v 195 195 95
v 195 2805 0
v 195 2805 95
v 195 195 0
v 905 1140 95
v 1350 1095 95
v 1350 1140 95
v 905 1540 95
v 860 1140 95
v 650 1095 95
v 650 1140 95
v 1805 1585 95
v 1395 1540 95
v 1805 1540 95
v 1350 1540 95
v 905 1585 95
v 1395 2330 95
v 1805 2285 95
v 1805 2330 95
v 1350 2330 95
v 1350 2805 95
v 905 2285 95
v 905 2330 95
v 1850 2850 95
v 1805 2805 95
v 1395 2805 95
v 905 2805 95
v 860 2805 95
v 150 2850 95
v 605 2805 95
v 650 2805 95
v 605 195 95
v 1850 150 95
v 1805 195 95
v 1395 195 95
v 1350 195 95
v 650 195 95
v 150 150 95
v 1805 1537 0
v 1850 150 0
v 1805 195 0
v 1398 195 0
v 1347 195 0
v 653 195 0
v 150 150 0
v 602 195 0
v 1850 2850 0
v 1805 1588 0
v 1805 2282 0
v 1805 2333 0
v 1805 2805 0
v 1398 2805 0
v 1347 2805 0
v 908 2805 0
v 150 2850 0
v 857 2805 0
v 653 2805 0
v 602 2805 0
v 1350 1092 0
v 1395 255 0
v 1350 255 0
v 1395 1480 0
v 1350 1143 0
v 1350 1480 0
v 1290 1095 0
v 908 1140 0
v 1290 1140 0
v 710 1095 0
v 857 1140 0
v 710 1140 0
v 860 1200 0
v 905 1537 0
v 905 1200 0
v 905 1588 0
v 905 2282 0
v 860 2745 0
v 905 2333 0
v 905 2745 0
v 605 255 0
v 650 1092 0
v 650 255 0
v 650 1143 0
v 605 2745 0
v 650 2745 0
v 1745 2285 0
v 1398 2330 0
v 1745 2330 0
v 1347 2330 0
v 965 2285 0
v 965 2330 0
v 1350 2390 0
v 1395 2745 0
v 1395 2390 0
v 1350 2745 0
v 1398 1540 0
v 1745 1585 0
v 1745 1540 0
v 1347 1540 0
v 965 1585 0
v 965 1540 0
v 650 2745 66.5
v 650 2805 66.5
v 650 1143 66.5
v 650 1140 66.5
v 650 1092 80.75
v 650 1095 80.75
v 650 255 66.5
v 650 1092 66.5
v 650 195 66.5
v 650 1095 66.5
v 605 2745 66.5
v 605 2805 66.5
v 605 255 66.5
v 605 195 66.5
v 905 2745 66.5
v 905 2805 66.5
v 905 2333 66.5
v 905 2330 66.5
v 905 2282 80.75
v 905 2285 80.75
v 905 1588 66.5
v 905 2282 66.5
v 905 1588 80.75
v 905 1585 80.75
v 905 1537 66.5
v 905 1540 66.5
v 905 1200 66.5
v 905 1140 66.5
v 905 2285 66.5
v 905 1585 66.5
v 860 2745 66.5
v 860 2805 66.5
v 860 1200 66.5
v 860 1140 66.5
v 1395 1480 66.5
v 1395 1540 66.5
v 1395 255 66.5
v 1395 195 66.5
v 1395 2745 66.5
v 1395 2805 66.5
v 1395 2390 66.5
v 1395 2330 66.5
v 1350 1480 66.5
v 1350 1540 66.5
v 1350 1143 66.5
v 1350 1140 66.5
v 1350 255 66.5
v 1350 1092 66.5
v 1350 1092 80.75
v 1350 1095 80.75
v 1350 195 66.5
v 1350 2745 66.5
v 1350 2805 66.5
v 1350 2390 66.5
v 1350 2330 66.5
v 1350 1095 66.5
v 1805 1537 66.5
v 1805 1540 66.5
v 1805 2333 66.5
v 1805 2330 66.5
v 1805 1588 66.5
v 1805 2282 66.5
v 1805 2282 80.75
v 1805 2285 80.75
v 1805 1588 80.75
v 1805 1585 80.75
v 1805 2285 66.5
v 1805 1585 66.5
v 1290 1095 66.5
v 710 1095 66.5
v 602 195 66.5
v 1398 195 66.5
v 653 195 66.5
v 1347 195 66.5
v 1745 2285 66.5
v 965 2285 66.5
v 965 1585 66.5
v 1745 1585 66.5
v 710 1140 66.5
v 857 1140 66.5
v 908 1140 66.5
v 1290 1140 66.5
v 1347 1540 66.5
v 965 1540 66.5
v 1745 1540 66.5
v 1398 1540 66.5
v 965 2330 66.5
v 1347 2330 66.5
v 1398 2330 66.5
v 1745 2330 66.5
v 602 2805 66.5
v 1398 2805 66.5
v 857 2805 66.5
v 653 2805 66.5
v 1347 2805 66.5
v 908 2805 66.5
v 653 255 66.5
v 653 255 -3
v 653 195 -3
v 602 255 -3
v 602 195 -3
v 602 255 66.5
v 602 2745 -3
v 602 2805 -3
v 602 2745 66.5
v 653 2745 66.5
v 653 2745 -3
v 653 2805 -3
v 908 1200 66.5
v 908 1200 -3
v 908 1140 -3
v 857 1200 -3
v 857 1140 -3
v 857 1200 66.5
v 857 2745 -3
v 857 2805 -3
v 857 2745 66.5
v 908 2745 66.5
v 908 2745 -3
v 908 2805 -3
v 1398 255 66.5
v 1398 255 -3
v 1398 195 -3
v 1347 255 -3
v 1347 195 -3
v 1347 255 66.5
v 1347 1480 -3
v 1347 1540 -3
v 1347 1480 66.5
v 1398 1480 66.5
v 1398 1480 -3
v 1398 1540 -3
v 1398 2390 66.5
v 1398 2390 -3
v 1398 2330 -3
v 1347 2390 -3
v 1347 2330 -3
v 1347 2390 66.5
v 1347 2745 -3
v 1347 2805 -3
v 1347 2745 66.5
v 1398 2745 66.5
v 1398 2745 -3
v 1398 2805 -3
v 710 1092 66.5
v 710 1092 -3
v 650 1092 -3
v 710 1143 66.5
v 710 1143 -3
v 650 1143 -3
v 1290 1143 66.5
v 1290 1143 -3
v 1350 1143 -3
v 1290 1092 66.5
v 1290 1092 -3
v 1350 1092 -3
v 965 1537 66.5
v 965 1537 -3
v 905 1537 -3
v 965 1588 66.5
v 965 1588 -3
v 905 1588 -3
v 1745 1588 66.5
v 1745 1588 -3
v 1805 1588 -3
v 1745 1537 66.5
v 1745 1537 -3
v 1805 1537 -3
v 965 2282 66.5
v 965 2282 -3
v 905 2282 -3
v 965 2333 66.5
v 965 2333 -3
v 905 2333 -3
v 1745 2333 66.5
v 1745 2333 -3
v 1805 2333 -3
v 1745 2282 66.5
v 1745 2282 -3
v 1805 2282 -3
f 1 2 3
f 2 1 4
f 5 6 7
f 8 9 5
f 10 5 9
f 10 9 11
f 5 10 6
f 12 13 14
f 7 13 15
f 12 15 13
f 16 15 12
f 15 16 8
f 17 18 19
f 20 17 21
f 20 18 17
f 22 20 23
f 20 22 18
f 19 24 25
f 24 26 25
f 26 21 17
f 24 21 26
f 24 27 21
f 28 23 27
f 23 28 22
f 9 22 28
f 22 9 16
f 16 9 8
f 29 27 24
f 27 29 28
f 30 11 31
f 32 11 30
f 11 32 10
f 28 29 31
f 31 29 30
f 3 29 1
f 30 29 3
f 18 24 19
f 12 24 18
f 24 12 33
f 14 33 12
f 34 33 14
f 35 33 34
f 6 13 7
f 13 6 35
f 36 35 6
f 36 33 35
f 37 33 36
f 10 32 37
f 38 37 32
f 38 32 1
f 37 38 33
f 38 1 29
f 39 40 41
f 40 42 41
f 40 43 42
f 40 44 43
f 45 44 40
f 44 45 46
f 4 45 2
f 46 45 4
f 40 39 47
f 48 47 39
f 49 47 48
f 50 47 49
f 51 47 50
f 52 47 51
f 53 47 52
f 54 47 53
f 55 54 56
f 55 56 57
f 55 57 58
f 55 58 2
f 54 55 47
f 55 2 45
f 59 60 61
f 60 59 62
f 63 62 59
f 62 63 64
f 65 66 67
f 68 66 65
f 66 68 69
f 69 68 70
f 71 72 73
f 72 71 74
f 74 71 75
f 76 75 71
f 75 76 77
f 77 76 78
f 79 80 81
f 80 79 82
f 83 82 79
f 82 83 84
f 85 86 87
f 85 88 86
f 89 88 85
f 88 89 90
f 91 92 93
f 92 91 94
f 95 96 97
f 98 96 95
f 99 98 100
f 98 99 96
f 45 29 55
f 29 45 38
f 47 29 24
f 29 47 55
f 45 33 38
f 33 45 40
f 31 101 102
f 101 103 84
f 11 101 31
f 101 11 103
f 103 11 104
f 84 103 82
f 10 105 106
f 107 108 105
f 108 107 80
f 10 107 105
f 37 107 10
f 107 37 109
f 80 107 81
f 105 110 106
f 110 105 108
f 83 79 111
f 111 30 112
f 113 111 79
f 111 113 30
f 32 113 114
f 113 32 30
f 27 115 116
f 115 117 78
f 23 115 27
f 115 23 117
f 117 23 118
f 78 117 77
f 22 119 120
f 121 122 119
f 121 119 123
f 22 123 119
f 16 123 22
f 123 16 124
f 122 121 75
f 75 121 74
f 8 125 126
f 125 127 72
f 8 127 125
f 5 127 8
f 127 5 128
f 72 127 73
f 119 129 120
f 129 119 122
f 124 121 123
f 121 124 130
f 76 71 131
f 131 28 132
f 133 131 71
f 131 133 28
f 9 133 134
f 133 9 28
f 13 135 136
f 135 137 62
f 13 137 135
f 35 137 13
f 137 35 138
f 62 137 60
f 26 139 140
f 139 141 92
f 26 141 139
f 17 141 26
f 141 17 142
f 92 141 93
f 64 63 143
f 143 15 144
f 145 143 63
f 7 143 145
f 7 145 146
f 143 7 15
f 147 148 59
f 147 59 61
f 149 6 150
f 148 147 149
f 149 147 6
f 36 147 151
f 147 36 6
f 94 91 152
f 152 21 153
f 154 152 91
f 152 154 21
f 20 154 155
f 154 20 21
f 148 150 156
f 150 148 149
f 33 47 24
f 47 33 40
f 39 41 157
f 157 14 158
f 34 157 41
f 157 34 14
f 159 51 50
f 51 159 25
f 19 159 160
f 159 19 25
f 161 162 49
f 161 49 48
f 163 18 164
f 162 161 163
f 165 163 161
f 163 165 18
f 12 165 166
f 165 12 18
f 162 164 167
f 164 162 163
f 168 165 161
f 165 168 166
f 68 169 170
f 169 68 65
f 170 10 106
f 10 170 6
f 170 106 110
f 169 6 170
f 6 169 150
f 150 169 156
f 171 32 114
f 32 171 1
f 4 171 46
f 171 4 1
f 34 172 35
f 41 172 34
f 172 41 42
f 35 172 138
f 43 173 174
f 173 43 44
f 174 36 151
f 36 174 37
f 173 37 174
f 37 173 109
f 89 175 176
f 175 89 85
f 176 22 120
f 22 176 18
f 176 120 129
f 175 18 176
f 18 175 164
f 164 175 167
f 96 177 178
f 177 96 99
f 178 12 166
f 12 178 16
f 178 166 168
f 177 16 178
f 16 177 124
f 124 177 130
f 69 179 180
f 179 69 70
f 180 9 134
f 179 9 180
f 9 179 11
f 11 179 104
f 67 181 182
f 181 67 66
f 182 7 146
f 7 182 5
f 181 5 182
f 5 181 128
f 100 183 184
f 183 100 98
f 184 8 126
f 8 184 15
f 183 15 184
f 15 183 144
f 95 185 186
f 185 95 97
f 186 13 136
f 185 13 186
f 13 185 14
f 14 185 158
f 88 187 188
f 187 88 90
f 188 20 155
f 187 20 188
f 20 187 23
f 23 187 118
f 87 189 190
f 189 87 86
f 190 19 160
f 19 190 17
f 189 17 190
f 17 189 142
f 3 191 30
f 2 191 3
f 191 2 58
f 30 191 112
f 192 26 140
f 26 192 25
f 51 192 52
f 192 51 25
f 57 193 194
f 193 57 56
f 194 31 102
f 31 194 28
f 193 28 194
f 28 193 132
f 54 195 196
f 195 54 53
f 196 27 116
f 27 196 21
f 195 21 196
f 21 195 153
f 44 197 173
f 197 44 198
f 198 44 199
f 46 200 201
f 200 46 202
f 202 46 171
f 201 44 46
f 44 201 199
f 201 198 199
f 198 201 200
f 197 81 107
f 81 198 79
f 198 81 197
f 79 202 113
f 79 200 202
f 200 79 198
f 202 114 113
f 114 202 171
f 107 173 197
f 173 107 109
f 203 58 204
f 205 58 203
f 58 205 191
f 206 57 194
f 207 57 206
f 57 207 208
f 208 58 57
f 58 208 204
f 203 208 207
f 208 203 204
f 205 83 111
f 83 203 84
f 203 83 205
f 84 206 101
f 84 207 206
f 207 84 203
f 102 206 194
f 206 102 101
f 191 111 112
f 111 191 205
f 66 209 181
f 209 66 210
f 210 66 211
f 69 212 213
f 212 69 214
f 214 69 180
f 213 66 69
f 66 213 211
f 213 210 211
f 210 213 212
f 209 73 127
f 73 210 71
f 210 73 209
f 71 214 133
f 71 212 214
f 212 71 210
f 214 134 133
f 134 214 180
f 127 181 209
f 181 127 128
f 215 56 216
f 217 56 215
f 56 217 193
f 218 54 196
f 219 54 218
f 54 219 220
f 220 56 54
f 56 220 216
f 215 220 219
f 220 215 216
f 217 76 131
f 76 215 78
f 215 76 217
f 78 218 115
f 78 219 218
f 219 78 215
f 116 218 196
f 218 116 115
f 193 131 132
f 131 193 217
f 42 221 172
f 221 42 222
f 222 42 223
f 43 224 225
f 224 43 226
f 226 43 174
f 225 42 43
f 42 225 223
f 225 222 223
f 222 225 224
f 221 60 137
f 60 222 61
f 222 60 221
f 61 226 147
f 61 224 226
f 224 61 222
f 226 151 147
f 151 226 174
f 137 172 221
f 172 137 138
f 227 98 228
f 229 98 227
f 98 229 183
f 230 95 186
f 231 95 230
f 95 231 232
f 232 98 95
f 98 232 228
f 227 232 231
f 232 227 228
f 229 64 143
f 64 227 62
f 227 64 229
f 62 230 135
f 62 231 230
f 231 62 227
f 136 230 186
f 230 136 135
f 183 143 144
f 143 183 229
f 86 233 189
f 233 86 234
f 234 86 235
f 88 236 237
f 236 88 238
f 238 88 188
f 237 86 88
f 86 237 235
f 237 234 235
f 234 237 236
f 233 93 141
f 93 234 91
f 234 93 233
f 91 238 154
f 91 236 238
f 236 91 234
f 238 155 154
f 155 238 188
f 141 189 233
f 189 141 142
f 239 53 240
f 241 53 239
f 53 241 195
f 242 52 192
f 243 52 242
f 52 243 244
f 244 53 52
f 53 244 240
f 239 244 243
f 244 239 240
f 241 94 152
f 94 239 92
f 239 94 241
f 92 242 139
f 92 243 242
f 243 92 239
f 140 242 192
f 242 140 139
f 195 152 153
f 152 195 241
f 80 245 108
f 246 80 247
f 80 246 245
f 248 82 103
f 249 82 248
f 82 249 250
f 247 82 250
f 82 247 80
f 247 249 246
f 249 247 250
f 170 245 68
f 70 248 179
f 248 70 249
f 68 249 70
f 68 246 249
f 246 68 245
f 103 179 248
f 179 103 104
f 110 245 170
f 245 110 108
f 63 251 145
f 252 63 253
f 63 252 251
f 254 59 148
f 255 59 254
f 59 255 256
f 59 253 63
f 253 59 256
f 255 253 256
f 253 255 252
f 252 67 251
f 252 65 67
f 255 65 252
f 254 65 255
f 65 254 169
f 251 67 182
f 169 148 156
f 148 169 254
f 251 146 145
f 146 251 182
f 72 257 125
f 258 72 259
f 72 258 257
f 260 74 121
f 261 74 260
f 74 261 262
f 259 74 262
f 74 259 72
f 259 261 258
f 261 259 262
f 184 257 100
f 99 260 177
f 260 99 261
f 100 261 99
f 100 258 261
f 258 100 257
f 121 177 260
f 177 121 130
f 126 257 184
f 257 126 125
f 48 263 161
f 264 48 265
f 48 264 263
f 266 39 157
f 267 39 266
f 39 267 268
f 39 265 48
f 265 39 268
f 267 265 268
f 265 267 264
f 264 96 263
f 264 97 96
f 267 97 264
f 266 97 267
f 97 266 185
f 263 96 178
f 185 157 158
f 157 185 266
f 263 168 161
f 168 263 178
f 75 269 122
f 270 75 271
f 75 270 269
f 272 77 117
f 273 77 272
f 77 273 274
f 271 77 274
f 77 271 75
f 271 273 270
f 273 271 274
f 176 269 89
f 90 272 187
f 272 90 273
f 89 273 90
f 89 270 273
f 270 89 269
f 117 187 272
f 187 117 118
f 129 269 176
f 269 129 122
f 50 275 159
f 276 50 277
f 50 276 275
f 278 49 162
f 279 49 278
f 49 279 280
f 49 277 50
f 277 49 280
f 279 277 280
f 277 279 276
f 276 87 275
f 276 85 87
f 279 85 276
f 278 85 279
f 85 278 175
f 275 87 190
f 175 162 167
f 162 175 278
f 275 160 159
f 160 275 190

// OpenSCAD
// file: ../../../src/lib/ctx.scad
// Context vectors and accessors.
// Conventions:
//  - dims:      basic geometric envelope (length, width, eave height, ...)
//  - palette:   colors used by every module
//  - clad_spec: cladding board geometry
//  - mesh_spec: mesh aperture / bar / frame
//  - stud_spec: stud framing

// --- dims --------------------------------------------------------------------

function dims(length, width, eave_h=2500, base_h=120, wall_t=100) =
    [length, width, eave_h, base_h, wall_t];

function dims_length(d) = d[0];
function dims_width(d)  = d[1];
function dims_eave_h(d) = d[2];
function dims_base_h(d) = d[3];
function dims_wall_t(d) = d[4];

// --- palette -----------------------------------------------------------------

function palette(
    post   = [0.72, 0.56, 0.30],
    wall   = [0.78, 0.65, 0.45],
    panel1 = [0.62, 0.45, 0.22],
    panel2 = [0.56, 0.40, 0.18],
    trim   = [0.58, 0.42, 0.20],
    mesh   = [0.25, 0.25, 0.25],
    roof   = [0.15, 0.15, 0.15],
    glass  = [0.70, 0.82, 0.88, 0.35],
    base   = [0.78, 0.78, 0.74],
    floor  = [0.80, 0.72, 0.52],
    table  = [0.72, 0.56, 0.34],
    bench  = [0.80, 0.70, 0.48],
    door   = [0.66, 0.48, 0.24],
    lamp   = [0.20, 0.20, 0.18],
    glow   = [1.00, 0.92, 0.60, 0.50],
    elec   = [0.85, 0.85, 0.82],
    laptop = [0.22, 0.22, 0.24],
    screen = [0.30, 0.55, 0.75, 0.60],
    shelf  = [0.65, 0.50, 0.28],
    polycarb = [0.78, 0.85, 0.92, 0.30],
    insulation = [0.95, 0.90, 0.65]
) = [post, wall, panel1, panel2, trim, mesh, roof, glass, base, floor,
     table, bench, door, lamp, glow, elec, laptop, screen, shelf,
     polycarb, insulation];

function pal_post(p)       = p[0];
function pal_wall(p)       = p[1];
function pal_panel1(p)     = p[2];
function pal_panel2(p)     = p[3];
function pal_trim(p)       = p[4];
function pal_mesh(p)       = p[5];
function pal_roof(p)       = p[6];
function pal_glass(p)      = p[7];
function pal_base(p)       = p[8];
function pal_floor(p)      = p[9];
function pal_table(p)      = p[10];
function pal_bench(p)      = p[11];
function pal_door(p)       = p[12];
function pal_lamp(p)       = p[13];
function pal_glow(p)       = p[14];
function pal_elec(p)       = p[15];
function pal_laptop(p)     = p[16];
function pal_screen(p)     = p[17];
function pal_shelf(p)      = p[18];
function pal_polycarb(p)   = p[19];
function pal_insulation(p) = p[20];

// --- clad_spec ---------------------------------------------------------------

function clad_spec(board_h=150, overlap=40, thick=24, lip=18) =
    [board_h, overlap, thick, lip];

function cs_board_h(c) = c[0];
function cs_overlap(c) = c[1];
function cs_thick(c)   = c[2];
function cs_lip(c)     = c[3];
function cs_step(c)    = c[0] - c[1];

// --- bob_spec (board-on-board cladding) -------------------------------------
//
// Vertical board-on-board cladding: two layers of boards. Back layer stepped at
// pitch = board_w + back_gap; front layer centred on the gaps, overlapping
// each adjacent back board by `overlap` mm per side.
//   board_w  = board width along the wall (e.g. 150 mm)
//   board_t  = board thickness (e.g. 25 mm)
//   overlap  = front-on-back overlap per side (e.g. 25 mm, BR minimum 22)
//   back_gap = gap between adjacent back boards (e.g. 100 mm)
// Invariant: board_w = back_gap + 2*overlap (so the front board exactly
// covers the gap + the required overlaps).

function bob_spec(board_w=150, board_t=25, overlap=25, back_gap=100) =
    [board_w, board_t, overlap, back_gap];

function bs_board_w(b)  = b[0];
function bs_board_t(b)  = b[1];
function bs_overlap(b)  = b[2];
function bs_back_gap(b) = b[3];
function bs_pitch(b)    = b[0] + b[3];     // c/c module width
function bs_stickout(b) = 2 * b[1];         // total cladding thickness

// --- mesh_spec ---------------------------------------------------------------

function mesh_spec(spacing=150, bar=8, frame=40, depth=20) =
    [spacing, bar, frame, depth];

function ms_spacing(m) = m[0];
function ms_bar(m)     = m[1];
function ms_frame(m)   = m[2];
function ms_depth(m)   = m[3];

// --- stud_spec ---------------------------------------------------------------

function stud_spec(stud_w=45, stud_d=95, spacing=600) =
    [stud_w, stud_d, spacing];

function ss_w(s)       = s[0];
function ss_d(s)       = s[1];
function ss_spacing(s) = s[2];
// file: ../../../src/lib/primitives/beslag.scad
// Beslag (steel connectors) primitives.
//
// Each module renders a simplified galvanised-grey shape. The geometry is
// approximate — the primary purpose is to make the connector visible at
// audit time so the user can see WHERE every bracket goes.

include <../defaults.scad>

BESLAG_COLOR = [0.62, 0.62, 0.66];

// M10 anchor screw, ~120 mm long. Head sits at Z=top_z (top of fundablok
// ring / sokkel), shaft sinks 120 mm down into the ring.
//   p     = [x, y] on the ring centerline
//   top_z = Z of the ring top (default 0 for legacy callers)
module ankerskrue_m10(p, top_z=0, system="fundament") {
    color(BESLAG_COLOR) {
        translate([p[0], p[1], top_z - 120]) cylinder(h=120, r=5, $fn=12);
        translate([p[0], p[1], top_z])       cylinder(h=8,  r1=10, r2=8, $fn=12);
    }
}

// 90×90 mm perforated angle bracket (vinkelbeslag), e.g. Simpson L70/L90.
//   leg          = leg length (mm)
//   thick        = steel thickness (mm)
//   width        = perpendicular flange width — the bracket's "depth" along
//                  the axis NOT in its bend plane. Default = thick (legacy
//                  thin-rod look). Pass ~50 mm for a realistic flat strap.
//   orientation  = "+x+z" / "-x+z" / "+y+z" / "-y+z" — bend plane.
//                  "+x+z" → leg-1 along +X face, leg-2 along +Z face.
//                  Width then extends along Y (the plane-perpendicular axis).
// Origin = inside corner of the L.
module vinkelbeslag(p, leg=90, thick=2, width=undef,
                    orientation="+x+z", system="vaegge") {
    w = is_undef(width) ? thick : width;
    color(BESLAG_COLOR)
    translate(p)
    if (orientation == "+x+z") {
        cube([leg, w, thick]);             // horizontal leg, +X
        cube([thick, w, leg]);             // vertical leg, +Z
    } else if (orientation == "-x+z") {
        translate([-leg, 0, 0])   cube([leg, w, thick]);
        translate([-thick, 0, 0]) cube([thick, w, leg]);
    } else if (orientation == "+y+z") {
        cube([w, leg, thick]);
        cube([w, thick, leg]);
    } else if (orientation == "-y+z") {
        translate([0, -leg, 0])   cube([w, leg, thick]);
        translate([0, -thick, 0]) cube([w, thick, leg]);
    }
}

// Joist hanger (stroesko / bjælkesko) — U-saddle that carries a floor strø /
// veksel where it frames into a header or ledger. Canonical orientation: the
// joist runs +Y away from the support; the support face is the X-Z plane at
// Y=0; the joist bottom sits at Z=0, centred on X=0. Rotate/translate to place.
//   w, h = joist section (width × height); seat = wrap length along the joist
module stroesko(w=45, h=95, seat=60, t=3, system="gulv") {
    color(BESLAG_COLOR) {
        // back flange nailed to the support face
        translate([-w/2 - t, -t, 0]) cube([w + 2*t, t, h*0.85]);
        // bottom saddle under the joist
        translate([-w/2 - t, 0, -t]) cube([w + 2*t, seat, t]);
        // two side straps up the joist faces
        translate([-w/2 - t, 0, 0]) cube([t, seat, h*0.70]);
        translate([ w/2,     0, 0]) cube([t, seat, h*0.70]);
    }
}
// file: ../../../src/lib/primitives/fundablok.scad
// Fundablok strip foundation primitive.
//
// DK fundablok = 50 × 15 × 20 cm concrete foundation block (length × width
// × height when laid), dry-stacked in 3 courses in halvstensforbandt with
// cores filled with armed concrete after laying. The continuous ring
// carries all wall lines (perimeter + interior load-bearing walls) and
// sits in a frostfri trench (~80 cm dig, 20 cm stabilgrus bottom layer,
// top of blocks at grade Z=0).
//
// fundablok_ring() renders each block individually with halvstensforbandt
// offsets — odd courses are shifted ½ block (250 mm) along the wall axis
// so vertical seams stagger between courses. Strips whose clear span
// isn't a multiple of 500 mm get a clipped end block (same as real
// practice — cut block on site).

FUNDABLOK_L         = 500;
FUNDABLOK_W         = 150;
FUNDABLOK_H         = 200;
FUNDABLOK_COLOR     = [0.78, 0.76, 0.72];
FUNDABLOK_JOINT     = 3;     // visible seam between blocks in a course
FUNDABLOK_JOINT_Z   = 2;     // visible seam between courses

// One row of fundabloks along +X within a strip of given length.
//   origin       = [x, y] of strip's outer-bottom corner
//   length       = strip length along X
//   z            = block bottom Z
//   start_offset = X position of first joint (0 for even courses, -L/2
//                  for odd courses to stagger seams)
module _fb_strip_x(origin, length, z, start_offset) {
    bl = FUNDABLOK_L; bw = FUNDABLOK_W; bh = FUNDABLOK_H;
    j  = FUNDABLOK_JOINT;
    for (raw_x = [start_offset - bl : bl : length]) {
        x0 = max(raw_x, 0);
        x1 = min(raw_x + bl, length);
        if (x1 - x0 > 1)
            translate([origin[0] + x0 + j/2, origin[1] + j/2, z])
                cube([x1 - x0 - j, bw - j, bh - FUNDABLOK_JOINT_Z]);
    }
}

// One row of fundabloks along +Y within a strip of given length.
module _fb_strip_y(origin, length, z, start_offset) {
    bl = FUNDABLOK_L; bw = FUNDABLOK_W; bh = FUNDABLOK_H;
    j  = FUNDABLOK_JOINT;
    for (raw_y = [start_offset - bl : bl : length]) {
        y0 = max(raw_y, 0);
        y1 = min(raw_y + bl, length);
        if (y1 - y0 > 1)
            translate([origin[0] + j/2, origin[1] + y0 + j/2, z])
                cube([bw - j, y1 - y0 - j, bh - FUNDABLOK_JOINT_Z]);
    }
}

// Multi-course fundablok strip — one segment of a ring, oriented along X
// or Y. Halvstensforbandt offsets are applied automatically across courses.
//   orientation = "X" or "Y"
//   origin      = [x, y] outer-bottom corner of the strip
//   length      = strip length along the chosen axis
//   courses     = number of vertical courses (default 3)
//   top_z       = Z of the top course's top face
module fundablok_strip(orientation, origin, length, courses = 3, top_z = 0) {
    h_per   = FUNDABLOK_H;
    total_h = courses * h_per;
    z_bot   = top_z - total_h;
    color(FUNDABLOK_COLOR)
    for (c = [0 : courses - 1]) {
        z   = z_bot + c * h_per;
        off = (c % 2 == 0) ? 0 : -FUNDABLOK_L / 2;
        if (orientation == "X")
            _fb_strip_x(origin, length, z, off);
        else
            _fb_strip_y(origin, length, z, off);
    }
}

// Continuous fundablok ring around a [ll × ww] rectangle with optional
// cross-walls at the X positions in `partitions_x`. The ring outer face
// is flush with [0,0]..[ll,ww] (the building outer line); the ring extends
// inward only by FUNDABLOK_W (150 mm) on each face.
//
// `top_z` sets the top-of-ring Z (= sokkel-niveau per the Phase 1 spec —
// "Top af ring = sokkel-niveau (= base h), bundrem af alle vægge sidder
// her"). Default 0 keeps the legacy "top at grade" behaviour. Total
// depth = courses × FUNDABLOK_H, so the ring extends `total_h` below
// `top_z` (most of which is buried in the frostfri grøft).
//
//   ll, ww        — footprint length (X), width (Y)
//   courses       — number of vertical courses (default 3 for halvstensforbandt)
//   partitions_x  — list of X coordinates for interior cross-walls
//   top_z         — Z of the top course's top face (sokkel level)
module fundablok_ring(ll, ww, courses = 3, partitions_x = [], top_z = 0) {
    bw      = FUNDABLOK_W;
    bl      = FUNDABLOK_L;
    h_per   = FUNDABLOK_H;
    total_h = courses * h_per;
    z_bot   = top_z - total_h;

    color(FUNDABLOK_COLOR)
    for (c = [0 : courses - 1]) {
        z   = z_bot + c * h_per;
        off = (c % 2 == 0) ? 0 : -bl/2;

        // Front + back strips run the full ring length along X.
        _fb_strip_x([0, 0],         ll, z, off);
        _fb_strip_x([0, ww - bw],   ll, z, off);

        // Left + right strips fill the clear span between front and back.
        _fb_strip_y([0, bw],         ww - 2*bw, z, off);
        _fb_strip_y([ll - bw, bw],   ww - 2*bw, z, off);

        // Interior cross-walls under load-bearing partitions.
        for (px = partitions_x)
            _fb_strip_y([px - bw/2, bw], ww - 2*bw, z, off);
    }
}
// file: ../../../src/lib/defaults.scad
// Default values. Each library file `include`s this so its module
// signatures can reference DEFAULT_* as default arg values.

include <ctx.scad>

DEFAULT_PALETTE = palette();
DEFAULT_CLAD    = clad_spec();
DEFAULT_BOB     = bob_spec();
DEFAULT_MESH    = mesh_spec();
DEFAULT_STUD    = stud_spec();
// file: ../../../src/designs/house/floor.scad
// HOUSE floor — split into two render modules so each layer can be inspected
// on its own:
//   RenderHouseFloorJoists() — bearing frame of 45×95 reglar laid hard against
//        the inside of the fundablok ring: ONE reglar along V3 and ONE along V5
//        (run in Y) + THREE intermediate bearers (also run in Y), with V1/V2
//        closing the front/back in X. The intermediate bearers are snapped to
//        the lem trimmer lines so each one DOUBLES as a hatch trimmer — no
//        parallel sliver beside the lem frame. Screwed to the ring / hung in
//        strøsko; nothing stacked.
//   RenderHouseFloorHangers()— strøsko at every hung junction (bearers/veksler)
//   RenderHouseFloorDeck()   — ~25 mm sawn-board deck running the SHORT way (X)
//   RenderHouseFloor()       — convenience wrapper (all three)
//
// Levels (z, mm above grade): deck TOP flush with the ring top (RH_BASE_H=120);
// reglar 0..95 against the ring inner faces, deck 95..120 on top.

include <../../lib/defaults.scad>
include <../config.scad>
include <../../lib/primitives/fundablok.scad>   // FUNDABLOK_W
use <../../lib/primitives/beslag.scad>          // stroesko

FLOOR_PLANK_W   = 145;   // visible board width
FLOOR_PLANK_GAP = 4;     // expansion gap between boards

// ring inner opening — the floor sits inside it, flush with the ring top
function _flr_rx0() = FUNDABLOK_W;                    // 150
function _flr_rx1() = RH_HOUSE_LEN   - FUNDABLOK_W;   // 1850
function _flr_ry0() = FUNDABLOK_W;                    // 150
function _flr_ry1() = RH_HOUSE_DEPTH - FUNDABLOK_W;   // 2850

// Bearing frame (ONE layer of 45×95 reglar). The board deck runs in X, so the
// load-bearing reglar run in Y at c/c <=600. The intermediate bearers are
// SNAPPED to the lem trimmer lines so each bearer also forms a hatch side —
// no near-parallel sliver beside the lem frame:
//   172.5  V3 edge          |  627.5  LEM1 left  (= hf[0]-rw/2)
//   882.5  LEM2 left        | 1372.5  LEM1 right (= hf[2]+rw/2)
//   1827.5 V5 edge          (= LEM2 right trimmer)
// → 5 bearers, deck spans 455/255/490/455 mm (all <=600 for the current hatch
// coords). Bearers run full Y and are cut where they cross a hatch opening; the
// veksler (X end pieces) box the remaining two sides. V1 + V2 close front/back.
module RenderHouseFloorJoists(palette = DEFAULT_PALETTE) {
    rx0 = _flr_rx0(); rx1 = _flr_rx1();
    ry0 = _flr_ry0(); ry1 = _flr_ry1();
    rw  = RH_FLOOR_REGLAR_W;         // 45
    rh  = RH_FLOOR_REGLAR_H;         // 95
    z0  = RH_FLOOR_REGLAR_Z;         // 0  (top at z0 + rh = 95)

    hf = RH_HATCH_FRONT; hh = RH_HATCH_HUMAN;
    // bearer X centrelines (run Y) — intermediate ones aligned to lem trimmers
    bxs     = [rx0 + rw/2, hf[0] - rw/2, hh[0] - rw/2, hf[2] + rw/2, rx1 - rw/2];
    hatches = [hf, hh];

    color(pal_post(palette)) {
        // Y-bearers, cut where they cross a hatch (the trimmer bearers run past
        // the opening and form its left/right sides).
        difference() {
            union()
                for (xc = bxs)
                    translate([xc - rw/2, ry0, z0]) cube([rw, ry1 - ry0, rh]);
            for (h = hatches)
                translate([h[0], h[1], z0 - 1]) cube([h[2]-h[0], h[3]-h[1], rh + 2]);
        }
        // Perimeter reglar along V1 (front) + V2 (back), run in X.
        translate([rx0 + rw, ry0,      z0]) cube([rx1 - rx0 - 2*rw, rw, rh]);
        translate([rx0 + rw, ry1 - rw, z0]) cube([rx1 - rx0 - 2*rw, rw, rh]);
        // Each hatch end gets a veksel (X header) that carries the cut bearers —
        // unless that end is already a perimeter reglar (V1/V2 serves as the
        // header there, e.g. LEM1's front edge). The two long sides are the
        // trimmer bearers above. This is the SOLE hatch frame; basement.scad
        // keys off RH_HATCH_* only for the fals, stairs and lid.
        for (h = hatches) {
            if (h[1] - rw > ry0)                                          // front end
                translate([h[0], h[1] - rw, z0]) cube([h[2]-h[0], rw, rh]);
            if (h[3] + rw < ry1)                                          // back end
                translate([h[0], h[3], z0]) cube([h[2]-h[0], rw, rh]);
        }
    }
}

// Board deck: ~25 mm boards running the SHORT way (X), top flush with ring top.
// Two hatch openings ("lem") are cut for the basement staircases; their edges
// land on the trimmer bearers below (see RH_HATCH_* in config).
module RenderHouseFloorDeck(palette = DEFAULT_PALETTE) {
    rx0 = _flr_rx0(); rx1 = _flr_rx1();
    ry0 = _flr_ry0(); ry1 = _flr_ry1();

    span = ry1 - ry0;
    n    = floor(span / FLOOR_PLANK_W);
    w    = span / n;                              // exact-fill plank pitch
    color(pal_floor(palette))
    difference() {
        for (i = [0 : n - 1])
            translate([rx0, ry0 + i * w, RH_FLOOR_DECK_Z])
                cube([rx1 - rx0, w - FLOOR_PLANK_GAP, RH_FLOOR_DECK_T]);
        for (h = [RH_HATCH_FRONT, RH_HATCH_HUMAN])
            translate([h[0], h[1], RH_FLOOR_DECK_Z - 5])
                cube([h[2] - h[0], h[3] - h[1], RH_FLOOR_DECK_T + 10]);
    }
}

// Joist hanger (strøsko) at a junction where a bearer/veksel frames INTO a
// transverse member. Canonical stroesko: joist runs +Y from the support face
// at Y=0. Here `dir` along `axis` sets the run direction, `run_at` is the
// support face on the run axis, `cross_c` the joist centre on the cross axis.
module _strosko(axis, dir, run_at, cross_c) {
    rot = (axis == "Y") ? (dir > 0 ? 0 : 180) : (dir > 0 ? -90 : 90);
    pos = (axis == "Y") ? [cross_c, run_at, RH_FLOOR_REGLAR_Z]
                        : [run_at, cross_c, RH_FLOOR_REGLAR_Z];
    translate(pos) rotate([0, 0, rot]) stroesko(RH_FLOOR_REGLAR_W, RH_FLOOR_REGLAR_H);
}

// Strøsko at every junction where a member is HUNG off a transverse one. The
// kant-bearers (V3/V5) and V1/V2 rest on the ring, so they need none. All
// coords derive from the hatch rectangles so they track RenderHouseFloorJoists.
module RenderHouseFloorHangers() {
    hf = RH_HATCH_FRONT; hh = RH_HATCH_HUMAN;
    rw = RH_FLOOR_REGLAR_W;
    ry0 = _flr_ry0(); ry1 = _flr_ry1();
    b_l1 = hf[0] - rw/2; b_r1 = hf[2] + rw/2;   // LEM1 side bearers (627.5, 1372.5)
    b_l2 = hh[0] - rw/2;                         // LEM2 left bearer (882.5)
    v1f  = ry0 + rw;     v2f  = ry1 - rw;        // V1/V2 solid faces (195, 2805)

    // 3 intermediate bearers → perimeter, or the veksel catching a cut end
    _strosko("Y", +1, v1f,        b_l1);   // 627.5  → V1
    _strosko("Y", -1, v2f,        b_l1);   // 627.5  → V2
    _strosko("Y", +1, hf[3] + rw, b_l2);   // 882.5  → LEM1 back veksel
    _strosko("Y", -1, v2f,        b_l2);   // 882.5  → V2
    _strosko("Y", +1, v1f,        b_r1);   // 1372.5 seg1 → V1
    _strosko("Y", -1, hh[1] - rw, b_r1);   // 1372.5 seg1 → LEM2 front veksel
    _strosko("Y", +1, hh[3] + rw, b_r1);   // 1372.5 seg2 → LEM2 back veksel
    _strosko("Y", -1, v2f,        b_r1);   // 1372.5 seg2 → V2
    // 3 veksler → their two side bearers
    _strosko("X", +1, hf[0], hf[3] + rw/2);   // LEM1 back veksel → 627.5
    _strosko("X", -1, hf[2], hf[3] + rw/2);   // LEM1 back veksel → 1372.5
    _strosko("X", +1, hh[0], hh[1] - rw/2);   // LEM2 front veksel → 882.5
    _strosko("X", -1, hh[2], hh[1] - rw/2);   // LEM2 front veksel → V5
    _strosko("X", +1, hh[0], hh[3] + rw/2);   // LEM2 back veksel → 882.5
    _strosko("X", -1, hh[2], hh[3] + rw/2);   // LEM2 back veksel → V5
}

module RenderHouseFloor(palette = DEFAULT_PALETTE) {
    RenderHouseFloorJoists(palette);
    RenderHouseFloorHangers();
    RenderHouseFloorDeck(palette);
}
// main file
// Doc image — floor bearing frame + strøsko (joist hangers), no deck, so the
// beslag at every hung junction are visible. Rendered from floor.scad.
include <../../../src/designs/config.scad>
use <../../../src/designs/house/floor.scad>
$fn = 32;

RenderHouseFloorJoists();
RenderHouseFloorHangers();
